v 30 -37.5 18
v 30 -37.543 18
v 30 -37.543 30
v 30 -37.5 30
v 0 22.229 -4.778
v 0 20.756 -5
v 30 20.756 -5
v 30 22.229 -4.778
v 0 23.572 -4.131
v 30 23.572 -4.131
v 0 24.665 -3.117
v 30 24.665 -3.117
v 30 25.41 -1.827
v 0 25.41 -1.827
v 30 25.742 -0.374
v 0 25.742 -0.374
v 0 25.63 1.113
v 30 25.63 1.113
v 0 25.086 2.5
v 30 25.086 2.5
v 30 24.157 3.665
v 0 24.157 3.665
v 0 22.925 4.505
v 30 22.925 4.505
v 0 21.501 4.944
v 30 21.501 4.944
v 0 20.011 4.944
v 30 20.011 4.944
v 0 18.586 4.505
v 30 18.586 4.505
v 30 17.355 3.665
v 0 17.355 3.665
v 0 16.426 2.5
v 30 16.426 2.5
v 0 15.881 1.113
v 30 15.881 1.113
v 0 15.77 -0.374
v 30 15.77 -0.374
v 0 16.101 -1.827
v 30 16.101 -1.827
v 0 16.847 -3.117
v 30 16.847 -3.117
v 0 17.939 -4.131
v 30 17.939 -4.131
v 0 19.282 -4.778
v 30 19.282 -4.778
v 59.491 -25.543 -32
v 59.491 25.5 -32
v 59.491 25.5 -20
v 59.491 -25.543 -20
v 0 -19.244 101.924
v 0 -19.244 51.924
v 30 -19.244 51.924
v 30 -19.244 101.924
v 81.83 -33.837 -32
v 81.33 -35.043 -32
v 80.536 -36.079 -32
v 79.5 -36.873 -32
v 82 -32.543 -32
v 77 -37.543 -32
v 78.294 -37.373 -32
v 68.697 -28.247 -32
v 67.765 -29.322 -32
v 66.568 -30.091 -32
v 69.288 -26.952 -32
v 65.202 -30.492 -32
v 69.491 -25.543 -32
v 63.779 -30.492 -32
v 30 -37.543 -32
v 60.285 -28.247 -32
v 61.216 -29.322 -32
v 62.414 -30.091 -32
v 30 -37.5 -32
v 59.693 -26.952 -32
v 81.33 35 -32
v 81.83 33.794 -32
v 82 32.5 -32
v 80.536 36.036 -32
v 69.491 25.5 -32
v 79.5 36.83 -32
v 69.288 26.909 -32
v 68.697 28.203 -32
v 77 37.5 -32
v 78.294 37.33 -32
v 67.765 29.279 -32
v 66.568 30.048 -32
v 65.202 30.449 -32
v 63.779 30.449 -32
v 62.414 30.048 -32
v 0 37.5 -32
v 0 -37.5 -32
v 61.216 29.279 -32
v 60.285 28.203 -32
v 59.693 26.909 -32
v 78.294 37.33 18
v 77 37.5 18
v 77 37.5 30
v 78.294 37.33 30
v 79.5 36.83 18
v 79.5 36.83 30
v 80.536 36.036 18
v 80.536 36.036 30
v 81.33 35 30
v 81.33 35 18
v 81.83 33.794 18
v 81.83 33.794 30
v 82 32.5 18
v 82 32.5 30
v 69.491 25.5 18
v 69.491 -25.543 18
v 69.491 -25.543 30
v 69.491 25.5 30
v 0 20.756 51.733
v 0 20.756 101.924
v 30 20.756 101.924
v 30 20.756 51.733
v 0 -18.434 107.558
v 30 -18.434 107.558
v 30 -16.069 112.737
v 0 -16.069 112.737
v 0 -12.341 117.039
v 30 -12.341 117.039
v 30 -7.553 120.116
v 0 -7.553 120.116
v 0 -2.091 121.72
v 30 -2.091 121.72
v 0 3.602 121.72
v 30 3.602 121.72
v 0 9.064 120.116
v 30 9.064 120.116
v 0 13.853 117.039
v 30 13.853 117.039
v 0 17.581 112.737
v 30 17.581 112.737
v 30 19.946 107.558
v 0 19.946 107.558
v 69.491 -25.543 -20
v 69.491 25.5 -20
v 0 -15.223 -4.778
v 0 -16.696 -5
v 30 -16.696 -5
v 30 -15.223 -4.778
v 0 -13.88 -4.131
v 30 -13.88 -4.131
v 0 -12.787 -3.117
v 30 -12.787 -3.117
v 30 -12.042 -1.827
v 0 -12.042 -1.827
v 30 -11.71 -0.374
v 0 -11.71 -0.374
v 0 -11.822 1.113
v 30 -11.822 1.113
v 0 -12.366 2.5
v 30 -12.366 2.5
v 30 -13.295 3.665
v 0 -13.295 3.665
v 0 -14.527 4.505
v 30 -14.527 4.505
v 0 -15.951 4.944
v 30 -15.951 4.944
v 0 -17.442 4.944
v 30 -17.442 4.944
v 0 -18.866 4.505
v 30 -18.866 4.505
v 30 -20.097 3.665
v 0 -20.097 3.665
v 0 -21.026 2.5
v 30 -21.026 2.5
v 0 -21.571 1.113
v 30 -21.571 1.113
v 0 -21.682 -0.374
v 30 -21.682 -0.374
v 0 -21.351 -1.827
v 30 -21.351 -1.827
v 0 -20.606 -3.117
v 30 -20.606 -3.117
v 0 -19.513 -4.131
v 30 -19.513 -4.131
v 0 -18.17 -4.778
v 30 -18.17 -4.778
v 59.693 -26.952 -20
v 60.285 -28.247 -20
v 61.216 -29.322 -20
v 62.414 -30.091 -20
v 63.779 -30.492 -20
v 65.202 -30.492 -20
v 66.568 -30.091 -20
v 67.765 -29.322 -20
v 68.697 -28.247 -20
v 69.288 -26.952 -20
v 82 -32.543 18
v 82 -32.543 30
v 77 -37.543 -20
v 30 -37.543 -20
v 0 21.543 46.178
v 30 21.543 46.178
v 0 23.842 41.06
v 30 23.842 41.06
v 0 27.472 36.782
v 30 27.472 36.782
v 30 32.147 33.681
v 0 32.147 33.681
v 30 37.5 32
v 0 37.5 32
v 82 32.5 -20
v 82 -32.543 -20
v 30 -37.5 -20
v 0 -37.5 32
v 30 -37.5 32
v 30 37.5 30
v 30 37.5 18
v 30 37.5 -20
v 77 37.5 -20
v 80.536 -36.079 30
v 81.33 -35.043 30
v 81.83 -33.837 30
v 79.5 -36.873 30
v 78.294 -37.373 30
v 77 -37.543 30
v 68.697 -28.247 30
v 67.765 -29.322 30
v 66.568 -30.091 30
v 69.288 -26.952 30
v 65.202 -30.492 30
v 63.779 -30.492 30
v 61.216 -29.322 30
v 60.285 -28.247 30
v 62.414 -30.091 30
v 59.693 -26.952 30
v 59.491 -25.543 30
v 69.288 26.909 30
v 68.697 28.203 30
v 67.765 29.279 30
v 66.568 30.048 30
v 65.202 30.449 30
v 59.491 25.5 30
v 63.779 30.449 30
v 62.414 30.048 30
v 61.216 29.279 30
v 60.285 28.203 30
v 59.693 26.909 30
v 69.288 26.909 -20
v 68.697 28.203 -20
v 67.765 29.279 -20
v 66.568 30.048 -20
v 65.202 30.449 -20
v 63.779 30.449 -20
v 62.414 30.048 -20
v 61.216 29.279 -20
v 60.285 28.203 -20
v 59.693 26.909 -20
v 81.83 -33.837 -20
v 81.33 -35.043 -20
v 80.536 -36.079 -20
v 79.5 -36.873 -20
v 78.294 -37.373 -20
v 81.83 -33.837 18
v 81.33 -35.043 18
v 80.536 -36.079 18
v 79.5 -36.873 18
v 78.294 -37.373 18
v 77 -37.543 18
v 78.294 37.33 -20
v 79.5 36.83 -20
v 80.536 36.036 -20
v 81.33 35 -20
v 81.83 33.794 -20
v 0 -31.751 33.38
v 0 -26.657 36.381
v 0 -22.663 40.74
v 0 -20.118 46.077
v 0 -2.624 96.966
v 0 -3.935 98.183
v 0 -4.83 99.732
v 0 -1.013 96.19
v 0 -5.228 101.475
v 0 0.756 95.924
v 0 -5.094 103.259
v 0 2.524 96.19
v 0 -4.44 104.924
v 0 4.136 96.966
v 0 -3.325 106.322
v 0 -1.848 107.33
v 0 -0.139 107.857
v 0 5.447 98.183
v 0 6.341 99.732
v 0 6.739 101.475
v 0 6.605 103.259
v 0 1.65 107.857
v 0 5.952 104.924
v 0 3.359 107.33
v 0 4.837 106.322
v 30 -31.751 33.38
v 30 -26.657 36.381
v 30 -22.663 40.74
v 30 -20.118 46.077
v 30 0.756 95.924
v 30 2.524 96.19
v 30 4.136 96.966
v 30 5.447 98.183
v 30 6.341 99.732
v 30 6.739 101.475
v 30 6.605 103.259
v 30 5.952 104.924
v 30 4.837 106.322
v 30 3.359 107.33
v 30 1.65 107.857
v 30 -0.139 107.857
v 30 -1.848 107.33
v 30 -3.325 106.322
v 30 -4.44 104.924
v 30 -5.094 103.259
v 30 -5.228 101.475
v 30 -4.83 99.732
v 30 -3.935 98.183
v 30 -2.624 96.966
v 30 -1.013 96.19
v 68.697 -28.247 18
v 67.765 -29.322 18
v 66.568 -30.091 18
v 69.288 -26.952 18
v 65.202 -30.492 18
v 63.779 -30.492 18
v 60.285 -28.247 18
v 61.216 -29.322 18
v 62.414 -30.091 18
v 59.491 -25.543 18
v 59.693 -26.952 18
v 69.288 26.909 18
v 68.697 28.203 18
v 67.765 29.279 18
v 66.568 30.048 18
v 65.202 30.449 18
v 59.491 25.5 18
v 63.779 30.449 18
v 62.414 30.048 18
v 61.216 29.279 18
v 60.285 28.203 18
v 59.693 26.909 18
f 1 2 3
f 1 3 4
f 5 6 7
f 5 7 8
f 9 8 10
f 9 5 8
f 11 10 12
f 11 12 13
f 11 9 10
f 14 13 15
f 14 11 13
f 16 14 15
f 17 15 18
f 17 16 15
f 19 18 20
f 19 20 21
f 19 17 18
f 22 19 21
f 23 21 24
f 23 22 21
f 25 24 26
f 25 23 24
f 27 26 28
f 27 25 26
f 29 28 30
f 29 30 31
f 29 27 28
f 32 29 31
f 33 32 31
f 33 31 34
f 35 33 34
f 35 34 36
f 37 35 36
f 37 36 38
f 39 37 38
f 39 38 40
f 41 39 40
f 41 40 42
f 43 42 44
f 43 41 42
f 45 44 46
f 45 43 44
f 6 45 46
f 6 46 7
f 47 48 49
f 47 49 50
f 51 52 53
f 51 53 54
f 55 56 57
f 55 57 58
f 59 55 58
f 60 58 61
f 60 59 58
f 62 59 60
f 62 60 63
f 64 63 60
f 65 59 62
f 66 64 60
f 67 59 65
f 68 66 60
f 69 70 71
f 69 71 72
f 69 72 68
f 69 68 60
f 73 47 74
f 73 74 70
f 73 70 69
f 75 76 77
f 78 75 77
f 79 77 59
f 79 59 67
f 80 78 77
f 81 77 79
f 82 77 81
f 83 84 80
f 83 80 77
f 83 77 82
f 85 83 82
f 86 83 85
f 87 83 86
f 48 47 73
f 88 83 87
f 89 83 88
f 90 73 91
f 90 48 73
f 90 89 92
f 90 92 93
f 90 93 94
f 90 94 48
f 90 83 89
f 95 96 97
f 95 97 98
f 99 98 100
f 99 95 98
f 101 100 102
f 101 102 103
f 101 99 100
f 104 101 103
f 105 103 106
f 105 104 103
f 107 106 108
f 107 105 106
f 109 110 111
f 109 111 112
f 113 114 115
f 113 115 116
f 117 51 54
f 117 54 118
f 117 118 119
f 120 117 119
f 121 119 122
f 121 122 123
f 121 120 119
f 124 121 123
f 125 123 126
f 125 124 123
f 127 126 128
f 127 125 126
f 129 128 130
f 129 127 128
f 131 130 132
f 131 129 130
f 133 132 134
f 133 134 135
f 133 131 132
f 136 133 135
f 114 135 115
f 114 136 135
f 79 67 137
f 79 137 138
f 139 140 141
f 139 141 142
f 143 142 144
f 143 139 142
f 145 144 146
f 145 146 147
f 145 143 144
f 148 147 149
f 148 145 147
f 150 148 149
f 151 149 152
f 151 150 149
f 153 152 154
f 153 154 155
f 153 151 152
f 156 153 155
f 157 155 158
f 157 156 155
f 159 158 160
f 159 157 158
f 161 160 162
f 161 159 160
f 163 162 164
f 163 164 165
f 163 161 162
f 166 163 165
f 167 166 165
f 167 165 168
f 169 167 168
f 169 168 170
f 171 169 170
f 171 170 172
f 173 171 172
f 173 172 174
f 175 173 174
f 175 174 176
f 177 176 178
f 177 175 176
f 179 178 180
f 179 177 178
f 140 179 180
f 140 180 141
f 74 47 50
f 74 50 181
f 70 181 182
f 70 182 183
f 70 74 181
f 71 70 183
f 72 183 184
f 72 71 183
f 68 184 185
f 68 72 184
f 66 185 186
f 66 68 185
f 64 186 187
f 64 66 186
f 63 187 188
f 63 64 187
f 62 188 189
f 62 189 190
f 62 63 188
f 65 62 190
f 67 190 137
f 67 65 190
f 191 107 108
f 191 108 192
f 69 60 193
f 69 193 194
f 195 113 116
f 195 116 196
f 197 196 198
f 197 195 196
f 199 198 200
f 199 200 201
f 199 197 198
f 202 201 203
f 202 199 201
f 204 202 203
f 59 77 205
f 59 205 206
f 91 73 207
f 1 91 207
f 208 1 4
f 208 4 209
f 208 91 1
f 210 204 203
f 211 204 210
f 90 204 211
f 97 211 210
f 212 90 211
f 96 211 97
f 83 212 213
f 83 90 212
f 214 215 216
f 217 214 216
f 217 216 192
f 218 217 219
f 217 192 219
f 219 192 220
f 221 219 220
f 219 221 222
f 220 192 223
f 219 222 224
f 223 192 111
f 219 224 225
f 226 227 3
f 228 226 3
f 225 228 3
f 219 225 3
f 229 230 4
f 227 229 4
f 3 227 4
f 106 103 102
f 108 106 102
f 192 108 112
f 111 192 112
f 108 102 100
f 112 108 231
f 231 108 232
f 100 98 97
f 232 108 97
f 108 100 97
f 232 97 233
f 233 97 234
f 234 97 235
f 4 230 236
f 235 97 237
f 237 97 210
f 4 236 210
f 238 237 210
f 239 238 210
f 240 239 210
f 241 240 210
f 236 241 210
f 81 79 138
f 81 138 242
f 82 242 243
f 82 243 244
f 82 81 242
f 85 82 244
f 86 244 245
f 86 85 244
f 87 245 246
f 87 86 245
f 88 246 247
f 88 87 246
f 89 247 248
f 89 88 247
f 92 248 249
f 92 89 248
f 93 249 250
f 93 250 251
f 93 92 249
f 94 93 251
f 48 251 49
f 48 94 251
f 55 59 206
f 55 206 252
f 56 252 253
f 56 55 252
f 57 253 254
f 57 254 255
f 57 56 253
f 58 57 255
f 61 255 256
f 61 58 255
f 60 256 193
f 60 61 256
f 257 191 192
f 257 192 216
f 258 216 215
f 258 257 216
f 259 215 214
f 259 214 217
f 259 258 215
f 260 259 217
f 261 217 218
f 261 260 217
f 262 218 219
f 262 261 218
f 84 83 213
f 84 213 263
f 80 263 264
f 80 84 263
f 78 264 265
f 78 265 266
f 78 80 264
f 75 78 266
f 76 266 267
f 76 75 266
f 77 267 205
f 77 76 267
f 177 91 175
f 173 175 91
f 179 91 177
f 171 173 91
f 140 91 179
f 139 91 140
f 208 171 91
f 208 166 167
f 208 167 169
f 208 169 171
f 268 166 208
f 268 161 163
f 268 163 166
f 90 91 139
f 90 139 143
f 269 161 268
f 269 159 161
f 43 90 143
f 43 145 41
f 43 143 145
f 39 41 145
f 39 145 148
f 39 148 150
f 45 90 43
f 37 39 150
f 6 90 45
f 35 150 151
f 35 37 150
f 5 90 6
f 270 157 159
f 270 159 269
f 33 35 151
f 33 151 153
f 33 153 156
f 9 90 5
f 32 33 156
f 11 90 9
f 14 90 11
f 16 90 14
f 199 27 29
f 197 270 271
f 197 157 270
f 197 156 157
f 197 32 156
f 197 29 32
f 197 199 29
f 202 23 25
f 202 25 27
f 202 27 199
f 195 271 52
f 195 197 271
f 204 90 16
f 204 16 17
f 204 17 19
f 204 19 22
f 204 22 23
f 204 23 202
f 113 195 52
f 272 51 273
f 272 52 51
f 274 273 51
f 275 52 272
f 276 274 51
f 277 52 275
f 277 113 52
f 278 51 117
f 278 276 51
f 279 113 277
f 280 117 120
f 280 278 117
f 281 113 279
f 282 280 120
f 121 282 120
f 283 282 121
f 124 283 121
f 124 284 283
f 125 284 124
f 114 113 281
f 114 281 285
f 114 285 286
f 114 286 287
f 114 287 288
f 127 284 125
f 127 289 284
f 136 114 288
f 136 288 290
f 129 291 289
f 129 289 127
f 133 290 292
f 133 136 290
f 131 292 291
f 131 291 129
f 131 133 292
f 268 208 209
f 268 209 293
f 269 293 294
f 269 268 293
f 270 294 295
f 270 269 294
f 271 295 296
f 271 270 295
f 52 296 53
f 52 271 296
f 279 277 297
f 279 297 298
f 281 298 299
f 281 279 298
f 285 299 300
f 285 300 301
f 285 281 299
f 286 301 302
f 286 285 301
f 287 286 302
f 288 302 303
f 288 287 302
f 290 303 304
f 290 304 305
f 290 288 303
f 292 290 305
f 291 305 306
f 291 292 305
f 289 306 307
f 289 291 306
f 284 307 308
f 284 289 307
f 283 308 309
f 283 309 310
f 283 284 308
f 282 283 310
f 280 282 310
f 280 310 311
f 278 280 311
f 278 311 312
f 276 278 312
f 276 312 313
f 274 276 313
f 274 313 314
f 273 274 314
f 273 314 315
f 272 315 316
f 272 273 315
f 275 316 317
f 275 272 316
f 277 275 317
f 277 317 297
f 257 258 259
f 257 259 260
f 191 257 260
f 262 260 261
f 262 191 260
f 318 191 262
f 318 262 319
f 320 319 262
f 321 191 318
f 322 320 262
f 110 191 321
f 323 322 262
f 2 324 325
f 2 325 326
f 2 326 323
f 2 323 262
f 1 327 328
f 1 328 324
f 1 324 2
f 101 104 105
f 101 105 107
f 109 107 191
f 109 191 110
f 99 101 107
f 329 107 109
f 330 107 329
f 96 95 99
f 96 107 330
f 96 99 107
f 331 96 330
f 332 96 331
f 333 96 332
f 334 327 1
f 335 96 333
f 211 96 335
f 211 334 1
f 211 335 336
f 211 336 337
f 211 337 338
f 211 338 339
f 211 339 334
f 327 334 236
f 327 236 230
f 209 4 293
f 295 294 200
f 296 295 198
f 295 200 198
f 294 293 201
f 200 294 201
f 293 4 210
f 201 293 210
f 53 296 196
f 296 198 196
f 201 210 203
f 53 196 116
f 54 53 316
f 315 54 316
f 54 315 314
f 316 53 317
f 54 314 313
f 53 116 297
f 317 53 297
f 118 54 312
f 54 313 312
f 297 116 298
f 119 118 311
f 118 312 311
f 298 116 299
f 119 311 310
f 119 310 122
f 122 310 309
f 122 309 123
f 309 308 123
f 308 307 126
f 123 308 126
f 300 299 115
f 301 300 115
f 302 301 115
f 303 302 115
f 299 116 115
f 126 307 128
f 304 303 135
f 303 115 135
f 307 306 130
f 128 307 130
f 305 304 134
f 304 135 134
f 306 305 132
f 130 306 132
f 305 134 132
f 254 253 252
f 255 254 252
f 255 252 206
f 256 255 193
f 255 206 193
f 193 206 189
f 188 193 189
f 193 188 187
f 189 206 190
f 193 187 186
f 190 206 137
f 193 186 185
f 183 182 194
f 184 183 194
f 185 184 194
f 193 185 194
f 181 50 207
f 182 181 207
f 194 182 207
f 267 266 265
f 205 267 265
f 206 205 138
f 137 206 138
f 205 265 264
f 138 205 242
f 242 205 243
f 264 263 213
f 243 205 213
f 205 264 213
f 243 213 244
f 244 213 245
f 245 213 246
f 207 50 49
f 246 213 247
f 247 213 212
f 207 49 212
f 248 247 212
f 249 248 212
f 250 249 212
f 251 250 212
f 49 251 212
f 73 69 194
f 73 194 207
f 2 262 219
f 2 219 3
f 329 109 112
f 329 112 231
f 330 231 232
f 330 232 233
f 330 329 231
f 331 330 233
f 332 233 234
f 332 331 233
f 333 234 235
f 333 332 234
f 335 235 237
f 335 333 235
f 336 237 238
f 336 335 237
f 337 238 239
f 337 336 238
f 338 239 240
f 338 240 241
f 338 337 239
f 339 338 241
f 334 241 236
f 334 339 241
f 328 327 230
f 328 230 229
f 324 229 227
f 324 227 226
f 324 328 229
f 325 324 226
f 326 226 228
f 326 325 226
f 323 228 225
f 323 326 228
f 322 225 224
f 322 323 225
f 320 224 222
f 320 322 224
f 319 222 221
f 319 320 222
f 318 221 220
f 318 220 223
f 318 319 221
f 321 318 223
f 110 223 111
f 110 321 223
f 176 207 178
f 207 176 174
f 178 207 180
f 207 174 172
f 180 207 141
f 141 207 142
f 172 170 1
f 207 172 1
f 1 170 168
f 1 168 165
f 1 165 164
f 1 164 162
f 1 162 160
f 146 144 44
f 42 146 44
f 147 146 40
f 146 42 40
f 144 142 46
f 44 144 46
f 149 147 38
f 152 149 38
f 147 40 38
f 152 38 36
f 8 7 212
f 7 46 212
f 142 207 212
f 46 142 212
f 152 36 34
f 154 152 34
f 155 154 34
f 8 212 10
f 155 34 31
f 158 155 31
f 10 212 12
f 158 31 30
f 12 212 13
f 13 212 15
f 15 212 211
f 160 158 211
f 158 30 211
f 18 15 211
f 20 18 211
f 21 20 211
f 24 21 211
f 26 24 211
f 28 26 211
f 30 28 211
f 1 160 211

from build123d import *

# Parameters (mm, degrees)
SKETCH2_R           = 6
SKETCH2_R_2         = 5
BOSS_EXTRUDE3_DEPTH = 30
BOSS_EXTRUDE6_DEPTH = 12
LPATTERN1_COUNT     = 2
LPATTERN1_PITCH     = 50


with BuildPart() as part:
    # Sketch2 → Boss-Extrude3 (new body)
    with BuildSketch(Plane(origin=(0, 0, 0), x_dir=(0, 0, -1), z_dir=(1, 0, 0))):
        with BuildLine():
            Line((-101.923792087, 20.755721108), (-51.733227817, 20.755721108))
            ThreePointArc((-51.733227817, 20.755721108), (-38.793259157, 25.505894516), (-32, 37.5))
            Line((-32, 37.5), (32, 37.5))
            Line((32, 37.5), (32, -37.5))
            Line((32, -37.5), (-32, -37.5))
            ThreePointArc((-32, -37.5), (-38.41241869, -24.498337453), (-51.923792087, -19.244278892))
            Line((-51.923792087, -19.244278892), (-101.923792087, -19.244278892))
            ThreePointArc((-101.923792087, -19.244278892), (-121.923792087, 0.755721108), (-101.923792087, 20.755721108))
        make_face()
        with Locations((-101.923792087, 0.755721108)):
            Circle(SKETCH2_R, mode=Mode.SUBTRACT)
        with Locations((0, 20.755721108)):
            Circle(SKETCH2_R_2, mode=Mode.SUBTRACT)
        with Locations((0, -16.696355723)):
            Circle(SKETCH2_R_2, mode=Mode.SUBTRACT)
    extrude(amount=BOSS_EXTRUDE3_DEPTH)

    # Sketch4 → Boss-Extrude6 (add)
    with BuildSketch(Plane(origin=(0, 0, -32), x_dir=(-1, 0, 0), z_dir=(0, 0, -1))):
        with BuildLine():
            Line((-30, 37.5), (-77, 37.5))
            ThreePointArc((-77, 37.5), (-80.535533906, 36.035533906), (-82, 32.5))
            Line((-82, 32.5), (-82, -32.543310804))
            ThreePointArc((-82, -32.543310804), (-80.535533906, -36.07884471), (-77, -37.543310804))
            Line((-77, -37.543310804), (-30, -37.543310804))
            Line((-30, -37.543310804), (-30, 37.5))
        make_face()
        with BuildLine():
            Line((-59.490773049, 25.5), (-59.490773049, -25.543310804))
            ThreePointArc((-59.490773049, -25.543310804), (-64.490773049, -30.543310804), (-69.490773049, -25.543310804))
            Line((-69.490773049, -25.543310804), (-69.490773049, 25.5))
            ThreePointArc((-69.490773049, 25.5), (-64.490773049, 30.5), (-59.490773049, 25.5))
        make_face(mode=Mode.SUBTRACT)
    boss_extrude6 = extrude(amount=-BOSS_EXTRUDE6_DEPTH)

    # LPattern1: Boss-Extrude6 ×2
    with Locations(*[(0, 0, i * LPATTERN1_PITCH) for i in range(1, LPATTERN1_COUNT)]):
        add(boss_extrude6)


solid = part.part
